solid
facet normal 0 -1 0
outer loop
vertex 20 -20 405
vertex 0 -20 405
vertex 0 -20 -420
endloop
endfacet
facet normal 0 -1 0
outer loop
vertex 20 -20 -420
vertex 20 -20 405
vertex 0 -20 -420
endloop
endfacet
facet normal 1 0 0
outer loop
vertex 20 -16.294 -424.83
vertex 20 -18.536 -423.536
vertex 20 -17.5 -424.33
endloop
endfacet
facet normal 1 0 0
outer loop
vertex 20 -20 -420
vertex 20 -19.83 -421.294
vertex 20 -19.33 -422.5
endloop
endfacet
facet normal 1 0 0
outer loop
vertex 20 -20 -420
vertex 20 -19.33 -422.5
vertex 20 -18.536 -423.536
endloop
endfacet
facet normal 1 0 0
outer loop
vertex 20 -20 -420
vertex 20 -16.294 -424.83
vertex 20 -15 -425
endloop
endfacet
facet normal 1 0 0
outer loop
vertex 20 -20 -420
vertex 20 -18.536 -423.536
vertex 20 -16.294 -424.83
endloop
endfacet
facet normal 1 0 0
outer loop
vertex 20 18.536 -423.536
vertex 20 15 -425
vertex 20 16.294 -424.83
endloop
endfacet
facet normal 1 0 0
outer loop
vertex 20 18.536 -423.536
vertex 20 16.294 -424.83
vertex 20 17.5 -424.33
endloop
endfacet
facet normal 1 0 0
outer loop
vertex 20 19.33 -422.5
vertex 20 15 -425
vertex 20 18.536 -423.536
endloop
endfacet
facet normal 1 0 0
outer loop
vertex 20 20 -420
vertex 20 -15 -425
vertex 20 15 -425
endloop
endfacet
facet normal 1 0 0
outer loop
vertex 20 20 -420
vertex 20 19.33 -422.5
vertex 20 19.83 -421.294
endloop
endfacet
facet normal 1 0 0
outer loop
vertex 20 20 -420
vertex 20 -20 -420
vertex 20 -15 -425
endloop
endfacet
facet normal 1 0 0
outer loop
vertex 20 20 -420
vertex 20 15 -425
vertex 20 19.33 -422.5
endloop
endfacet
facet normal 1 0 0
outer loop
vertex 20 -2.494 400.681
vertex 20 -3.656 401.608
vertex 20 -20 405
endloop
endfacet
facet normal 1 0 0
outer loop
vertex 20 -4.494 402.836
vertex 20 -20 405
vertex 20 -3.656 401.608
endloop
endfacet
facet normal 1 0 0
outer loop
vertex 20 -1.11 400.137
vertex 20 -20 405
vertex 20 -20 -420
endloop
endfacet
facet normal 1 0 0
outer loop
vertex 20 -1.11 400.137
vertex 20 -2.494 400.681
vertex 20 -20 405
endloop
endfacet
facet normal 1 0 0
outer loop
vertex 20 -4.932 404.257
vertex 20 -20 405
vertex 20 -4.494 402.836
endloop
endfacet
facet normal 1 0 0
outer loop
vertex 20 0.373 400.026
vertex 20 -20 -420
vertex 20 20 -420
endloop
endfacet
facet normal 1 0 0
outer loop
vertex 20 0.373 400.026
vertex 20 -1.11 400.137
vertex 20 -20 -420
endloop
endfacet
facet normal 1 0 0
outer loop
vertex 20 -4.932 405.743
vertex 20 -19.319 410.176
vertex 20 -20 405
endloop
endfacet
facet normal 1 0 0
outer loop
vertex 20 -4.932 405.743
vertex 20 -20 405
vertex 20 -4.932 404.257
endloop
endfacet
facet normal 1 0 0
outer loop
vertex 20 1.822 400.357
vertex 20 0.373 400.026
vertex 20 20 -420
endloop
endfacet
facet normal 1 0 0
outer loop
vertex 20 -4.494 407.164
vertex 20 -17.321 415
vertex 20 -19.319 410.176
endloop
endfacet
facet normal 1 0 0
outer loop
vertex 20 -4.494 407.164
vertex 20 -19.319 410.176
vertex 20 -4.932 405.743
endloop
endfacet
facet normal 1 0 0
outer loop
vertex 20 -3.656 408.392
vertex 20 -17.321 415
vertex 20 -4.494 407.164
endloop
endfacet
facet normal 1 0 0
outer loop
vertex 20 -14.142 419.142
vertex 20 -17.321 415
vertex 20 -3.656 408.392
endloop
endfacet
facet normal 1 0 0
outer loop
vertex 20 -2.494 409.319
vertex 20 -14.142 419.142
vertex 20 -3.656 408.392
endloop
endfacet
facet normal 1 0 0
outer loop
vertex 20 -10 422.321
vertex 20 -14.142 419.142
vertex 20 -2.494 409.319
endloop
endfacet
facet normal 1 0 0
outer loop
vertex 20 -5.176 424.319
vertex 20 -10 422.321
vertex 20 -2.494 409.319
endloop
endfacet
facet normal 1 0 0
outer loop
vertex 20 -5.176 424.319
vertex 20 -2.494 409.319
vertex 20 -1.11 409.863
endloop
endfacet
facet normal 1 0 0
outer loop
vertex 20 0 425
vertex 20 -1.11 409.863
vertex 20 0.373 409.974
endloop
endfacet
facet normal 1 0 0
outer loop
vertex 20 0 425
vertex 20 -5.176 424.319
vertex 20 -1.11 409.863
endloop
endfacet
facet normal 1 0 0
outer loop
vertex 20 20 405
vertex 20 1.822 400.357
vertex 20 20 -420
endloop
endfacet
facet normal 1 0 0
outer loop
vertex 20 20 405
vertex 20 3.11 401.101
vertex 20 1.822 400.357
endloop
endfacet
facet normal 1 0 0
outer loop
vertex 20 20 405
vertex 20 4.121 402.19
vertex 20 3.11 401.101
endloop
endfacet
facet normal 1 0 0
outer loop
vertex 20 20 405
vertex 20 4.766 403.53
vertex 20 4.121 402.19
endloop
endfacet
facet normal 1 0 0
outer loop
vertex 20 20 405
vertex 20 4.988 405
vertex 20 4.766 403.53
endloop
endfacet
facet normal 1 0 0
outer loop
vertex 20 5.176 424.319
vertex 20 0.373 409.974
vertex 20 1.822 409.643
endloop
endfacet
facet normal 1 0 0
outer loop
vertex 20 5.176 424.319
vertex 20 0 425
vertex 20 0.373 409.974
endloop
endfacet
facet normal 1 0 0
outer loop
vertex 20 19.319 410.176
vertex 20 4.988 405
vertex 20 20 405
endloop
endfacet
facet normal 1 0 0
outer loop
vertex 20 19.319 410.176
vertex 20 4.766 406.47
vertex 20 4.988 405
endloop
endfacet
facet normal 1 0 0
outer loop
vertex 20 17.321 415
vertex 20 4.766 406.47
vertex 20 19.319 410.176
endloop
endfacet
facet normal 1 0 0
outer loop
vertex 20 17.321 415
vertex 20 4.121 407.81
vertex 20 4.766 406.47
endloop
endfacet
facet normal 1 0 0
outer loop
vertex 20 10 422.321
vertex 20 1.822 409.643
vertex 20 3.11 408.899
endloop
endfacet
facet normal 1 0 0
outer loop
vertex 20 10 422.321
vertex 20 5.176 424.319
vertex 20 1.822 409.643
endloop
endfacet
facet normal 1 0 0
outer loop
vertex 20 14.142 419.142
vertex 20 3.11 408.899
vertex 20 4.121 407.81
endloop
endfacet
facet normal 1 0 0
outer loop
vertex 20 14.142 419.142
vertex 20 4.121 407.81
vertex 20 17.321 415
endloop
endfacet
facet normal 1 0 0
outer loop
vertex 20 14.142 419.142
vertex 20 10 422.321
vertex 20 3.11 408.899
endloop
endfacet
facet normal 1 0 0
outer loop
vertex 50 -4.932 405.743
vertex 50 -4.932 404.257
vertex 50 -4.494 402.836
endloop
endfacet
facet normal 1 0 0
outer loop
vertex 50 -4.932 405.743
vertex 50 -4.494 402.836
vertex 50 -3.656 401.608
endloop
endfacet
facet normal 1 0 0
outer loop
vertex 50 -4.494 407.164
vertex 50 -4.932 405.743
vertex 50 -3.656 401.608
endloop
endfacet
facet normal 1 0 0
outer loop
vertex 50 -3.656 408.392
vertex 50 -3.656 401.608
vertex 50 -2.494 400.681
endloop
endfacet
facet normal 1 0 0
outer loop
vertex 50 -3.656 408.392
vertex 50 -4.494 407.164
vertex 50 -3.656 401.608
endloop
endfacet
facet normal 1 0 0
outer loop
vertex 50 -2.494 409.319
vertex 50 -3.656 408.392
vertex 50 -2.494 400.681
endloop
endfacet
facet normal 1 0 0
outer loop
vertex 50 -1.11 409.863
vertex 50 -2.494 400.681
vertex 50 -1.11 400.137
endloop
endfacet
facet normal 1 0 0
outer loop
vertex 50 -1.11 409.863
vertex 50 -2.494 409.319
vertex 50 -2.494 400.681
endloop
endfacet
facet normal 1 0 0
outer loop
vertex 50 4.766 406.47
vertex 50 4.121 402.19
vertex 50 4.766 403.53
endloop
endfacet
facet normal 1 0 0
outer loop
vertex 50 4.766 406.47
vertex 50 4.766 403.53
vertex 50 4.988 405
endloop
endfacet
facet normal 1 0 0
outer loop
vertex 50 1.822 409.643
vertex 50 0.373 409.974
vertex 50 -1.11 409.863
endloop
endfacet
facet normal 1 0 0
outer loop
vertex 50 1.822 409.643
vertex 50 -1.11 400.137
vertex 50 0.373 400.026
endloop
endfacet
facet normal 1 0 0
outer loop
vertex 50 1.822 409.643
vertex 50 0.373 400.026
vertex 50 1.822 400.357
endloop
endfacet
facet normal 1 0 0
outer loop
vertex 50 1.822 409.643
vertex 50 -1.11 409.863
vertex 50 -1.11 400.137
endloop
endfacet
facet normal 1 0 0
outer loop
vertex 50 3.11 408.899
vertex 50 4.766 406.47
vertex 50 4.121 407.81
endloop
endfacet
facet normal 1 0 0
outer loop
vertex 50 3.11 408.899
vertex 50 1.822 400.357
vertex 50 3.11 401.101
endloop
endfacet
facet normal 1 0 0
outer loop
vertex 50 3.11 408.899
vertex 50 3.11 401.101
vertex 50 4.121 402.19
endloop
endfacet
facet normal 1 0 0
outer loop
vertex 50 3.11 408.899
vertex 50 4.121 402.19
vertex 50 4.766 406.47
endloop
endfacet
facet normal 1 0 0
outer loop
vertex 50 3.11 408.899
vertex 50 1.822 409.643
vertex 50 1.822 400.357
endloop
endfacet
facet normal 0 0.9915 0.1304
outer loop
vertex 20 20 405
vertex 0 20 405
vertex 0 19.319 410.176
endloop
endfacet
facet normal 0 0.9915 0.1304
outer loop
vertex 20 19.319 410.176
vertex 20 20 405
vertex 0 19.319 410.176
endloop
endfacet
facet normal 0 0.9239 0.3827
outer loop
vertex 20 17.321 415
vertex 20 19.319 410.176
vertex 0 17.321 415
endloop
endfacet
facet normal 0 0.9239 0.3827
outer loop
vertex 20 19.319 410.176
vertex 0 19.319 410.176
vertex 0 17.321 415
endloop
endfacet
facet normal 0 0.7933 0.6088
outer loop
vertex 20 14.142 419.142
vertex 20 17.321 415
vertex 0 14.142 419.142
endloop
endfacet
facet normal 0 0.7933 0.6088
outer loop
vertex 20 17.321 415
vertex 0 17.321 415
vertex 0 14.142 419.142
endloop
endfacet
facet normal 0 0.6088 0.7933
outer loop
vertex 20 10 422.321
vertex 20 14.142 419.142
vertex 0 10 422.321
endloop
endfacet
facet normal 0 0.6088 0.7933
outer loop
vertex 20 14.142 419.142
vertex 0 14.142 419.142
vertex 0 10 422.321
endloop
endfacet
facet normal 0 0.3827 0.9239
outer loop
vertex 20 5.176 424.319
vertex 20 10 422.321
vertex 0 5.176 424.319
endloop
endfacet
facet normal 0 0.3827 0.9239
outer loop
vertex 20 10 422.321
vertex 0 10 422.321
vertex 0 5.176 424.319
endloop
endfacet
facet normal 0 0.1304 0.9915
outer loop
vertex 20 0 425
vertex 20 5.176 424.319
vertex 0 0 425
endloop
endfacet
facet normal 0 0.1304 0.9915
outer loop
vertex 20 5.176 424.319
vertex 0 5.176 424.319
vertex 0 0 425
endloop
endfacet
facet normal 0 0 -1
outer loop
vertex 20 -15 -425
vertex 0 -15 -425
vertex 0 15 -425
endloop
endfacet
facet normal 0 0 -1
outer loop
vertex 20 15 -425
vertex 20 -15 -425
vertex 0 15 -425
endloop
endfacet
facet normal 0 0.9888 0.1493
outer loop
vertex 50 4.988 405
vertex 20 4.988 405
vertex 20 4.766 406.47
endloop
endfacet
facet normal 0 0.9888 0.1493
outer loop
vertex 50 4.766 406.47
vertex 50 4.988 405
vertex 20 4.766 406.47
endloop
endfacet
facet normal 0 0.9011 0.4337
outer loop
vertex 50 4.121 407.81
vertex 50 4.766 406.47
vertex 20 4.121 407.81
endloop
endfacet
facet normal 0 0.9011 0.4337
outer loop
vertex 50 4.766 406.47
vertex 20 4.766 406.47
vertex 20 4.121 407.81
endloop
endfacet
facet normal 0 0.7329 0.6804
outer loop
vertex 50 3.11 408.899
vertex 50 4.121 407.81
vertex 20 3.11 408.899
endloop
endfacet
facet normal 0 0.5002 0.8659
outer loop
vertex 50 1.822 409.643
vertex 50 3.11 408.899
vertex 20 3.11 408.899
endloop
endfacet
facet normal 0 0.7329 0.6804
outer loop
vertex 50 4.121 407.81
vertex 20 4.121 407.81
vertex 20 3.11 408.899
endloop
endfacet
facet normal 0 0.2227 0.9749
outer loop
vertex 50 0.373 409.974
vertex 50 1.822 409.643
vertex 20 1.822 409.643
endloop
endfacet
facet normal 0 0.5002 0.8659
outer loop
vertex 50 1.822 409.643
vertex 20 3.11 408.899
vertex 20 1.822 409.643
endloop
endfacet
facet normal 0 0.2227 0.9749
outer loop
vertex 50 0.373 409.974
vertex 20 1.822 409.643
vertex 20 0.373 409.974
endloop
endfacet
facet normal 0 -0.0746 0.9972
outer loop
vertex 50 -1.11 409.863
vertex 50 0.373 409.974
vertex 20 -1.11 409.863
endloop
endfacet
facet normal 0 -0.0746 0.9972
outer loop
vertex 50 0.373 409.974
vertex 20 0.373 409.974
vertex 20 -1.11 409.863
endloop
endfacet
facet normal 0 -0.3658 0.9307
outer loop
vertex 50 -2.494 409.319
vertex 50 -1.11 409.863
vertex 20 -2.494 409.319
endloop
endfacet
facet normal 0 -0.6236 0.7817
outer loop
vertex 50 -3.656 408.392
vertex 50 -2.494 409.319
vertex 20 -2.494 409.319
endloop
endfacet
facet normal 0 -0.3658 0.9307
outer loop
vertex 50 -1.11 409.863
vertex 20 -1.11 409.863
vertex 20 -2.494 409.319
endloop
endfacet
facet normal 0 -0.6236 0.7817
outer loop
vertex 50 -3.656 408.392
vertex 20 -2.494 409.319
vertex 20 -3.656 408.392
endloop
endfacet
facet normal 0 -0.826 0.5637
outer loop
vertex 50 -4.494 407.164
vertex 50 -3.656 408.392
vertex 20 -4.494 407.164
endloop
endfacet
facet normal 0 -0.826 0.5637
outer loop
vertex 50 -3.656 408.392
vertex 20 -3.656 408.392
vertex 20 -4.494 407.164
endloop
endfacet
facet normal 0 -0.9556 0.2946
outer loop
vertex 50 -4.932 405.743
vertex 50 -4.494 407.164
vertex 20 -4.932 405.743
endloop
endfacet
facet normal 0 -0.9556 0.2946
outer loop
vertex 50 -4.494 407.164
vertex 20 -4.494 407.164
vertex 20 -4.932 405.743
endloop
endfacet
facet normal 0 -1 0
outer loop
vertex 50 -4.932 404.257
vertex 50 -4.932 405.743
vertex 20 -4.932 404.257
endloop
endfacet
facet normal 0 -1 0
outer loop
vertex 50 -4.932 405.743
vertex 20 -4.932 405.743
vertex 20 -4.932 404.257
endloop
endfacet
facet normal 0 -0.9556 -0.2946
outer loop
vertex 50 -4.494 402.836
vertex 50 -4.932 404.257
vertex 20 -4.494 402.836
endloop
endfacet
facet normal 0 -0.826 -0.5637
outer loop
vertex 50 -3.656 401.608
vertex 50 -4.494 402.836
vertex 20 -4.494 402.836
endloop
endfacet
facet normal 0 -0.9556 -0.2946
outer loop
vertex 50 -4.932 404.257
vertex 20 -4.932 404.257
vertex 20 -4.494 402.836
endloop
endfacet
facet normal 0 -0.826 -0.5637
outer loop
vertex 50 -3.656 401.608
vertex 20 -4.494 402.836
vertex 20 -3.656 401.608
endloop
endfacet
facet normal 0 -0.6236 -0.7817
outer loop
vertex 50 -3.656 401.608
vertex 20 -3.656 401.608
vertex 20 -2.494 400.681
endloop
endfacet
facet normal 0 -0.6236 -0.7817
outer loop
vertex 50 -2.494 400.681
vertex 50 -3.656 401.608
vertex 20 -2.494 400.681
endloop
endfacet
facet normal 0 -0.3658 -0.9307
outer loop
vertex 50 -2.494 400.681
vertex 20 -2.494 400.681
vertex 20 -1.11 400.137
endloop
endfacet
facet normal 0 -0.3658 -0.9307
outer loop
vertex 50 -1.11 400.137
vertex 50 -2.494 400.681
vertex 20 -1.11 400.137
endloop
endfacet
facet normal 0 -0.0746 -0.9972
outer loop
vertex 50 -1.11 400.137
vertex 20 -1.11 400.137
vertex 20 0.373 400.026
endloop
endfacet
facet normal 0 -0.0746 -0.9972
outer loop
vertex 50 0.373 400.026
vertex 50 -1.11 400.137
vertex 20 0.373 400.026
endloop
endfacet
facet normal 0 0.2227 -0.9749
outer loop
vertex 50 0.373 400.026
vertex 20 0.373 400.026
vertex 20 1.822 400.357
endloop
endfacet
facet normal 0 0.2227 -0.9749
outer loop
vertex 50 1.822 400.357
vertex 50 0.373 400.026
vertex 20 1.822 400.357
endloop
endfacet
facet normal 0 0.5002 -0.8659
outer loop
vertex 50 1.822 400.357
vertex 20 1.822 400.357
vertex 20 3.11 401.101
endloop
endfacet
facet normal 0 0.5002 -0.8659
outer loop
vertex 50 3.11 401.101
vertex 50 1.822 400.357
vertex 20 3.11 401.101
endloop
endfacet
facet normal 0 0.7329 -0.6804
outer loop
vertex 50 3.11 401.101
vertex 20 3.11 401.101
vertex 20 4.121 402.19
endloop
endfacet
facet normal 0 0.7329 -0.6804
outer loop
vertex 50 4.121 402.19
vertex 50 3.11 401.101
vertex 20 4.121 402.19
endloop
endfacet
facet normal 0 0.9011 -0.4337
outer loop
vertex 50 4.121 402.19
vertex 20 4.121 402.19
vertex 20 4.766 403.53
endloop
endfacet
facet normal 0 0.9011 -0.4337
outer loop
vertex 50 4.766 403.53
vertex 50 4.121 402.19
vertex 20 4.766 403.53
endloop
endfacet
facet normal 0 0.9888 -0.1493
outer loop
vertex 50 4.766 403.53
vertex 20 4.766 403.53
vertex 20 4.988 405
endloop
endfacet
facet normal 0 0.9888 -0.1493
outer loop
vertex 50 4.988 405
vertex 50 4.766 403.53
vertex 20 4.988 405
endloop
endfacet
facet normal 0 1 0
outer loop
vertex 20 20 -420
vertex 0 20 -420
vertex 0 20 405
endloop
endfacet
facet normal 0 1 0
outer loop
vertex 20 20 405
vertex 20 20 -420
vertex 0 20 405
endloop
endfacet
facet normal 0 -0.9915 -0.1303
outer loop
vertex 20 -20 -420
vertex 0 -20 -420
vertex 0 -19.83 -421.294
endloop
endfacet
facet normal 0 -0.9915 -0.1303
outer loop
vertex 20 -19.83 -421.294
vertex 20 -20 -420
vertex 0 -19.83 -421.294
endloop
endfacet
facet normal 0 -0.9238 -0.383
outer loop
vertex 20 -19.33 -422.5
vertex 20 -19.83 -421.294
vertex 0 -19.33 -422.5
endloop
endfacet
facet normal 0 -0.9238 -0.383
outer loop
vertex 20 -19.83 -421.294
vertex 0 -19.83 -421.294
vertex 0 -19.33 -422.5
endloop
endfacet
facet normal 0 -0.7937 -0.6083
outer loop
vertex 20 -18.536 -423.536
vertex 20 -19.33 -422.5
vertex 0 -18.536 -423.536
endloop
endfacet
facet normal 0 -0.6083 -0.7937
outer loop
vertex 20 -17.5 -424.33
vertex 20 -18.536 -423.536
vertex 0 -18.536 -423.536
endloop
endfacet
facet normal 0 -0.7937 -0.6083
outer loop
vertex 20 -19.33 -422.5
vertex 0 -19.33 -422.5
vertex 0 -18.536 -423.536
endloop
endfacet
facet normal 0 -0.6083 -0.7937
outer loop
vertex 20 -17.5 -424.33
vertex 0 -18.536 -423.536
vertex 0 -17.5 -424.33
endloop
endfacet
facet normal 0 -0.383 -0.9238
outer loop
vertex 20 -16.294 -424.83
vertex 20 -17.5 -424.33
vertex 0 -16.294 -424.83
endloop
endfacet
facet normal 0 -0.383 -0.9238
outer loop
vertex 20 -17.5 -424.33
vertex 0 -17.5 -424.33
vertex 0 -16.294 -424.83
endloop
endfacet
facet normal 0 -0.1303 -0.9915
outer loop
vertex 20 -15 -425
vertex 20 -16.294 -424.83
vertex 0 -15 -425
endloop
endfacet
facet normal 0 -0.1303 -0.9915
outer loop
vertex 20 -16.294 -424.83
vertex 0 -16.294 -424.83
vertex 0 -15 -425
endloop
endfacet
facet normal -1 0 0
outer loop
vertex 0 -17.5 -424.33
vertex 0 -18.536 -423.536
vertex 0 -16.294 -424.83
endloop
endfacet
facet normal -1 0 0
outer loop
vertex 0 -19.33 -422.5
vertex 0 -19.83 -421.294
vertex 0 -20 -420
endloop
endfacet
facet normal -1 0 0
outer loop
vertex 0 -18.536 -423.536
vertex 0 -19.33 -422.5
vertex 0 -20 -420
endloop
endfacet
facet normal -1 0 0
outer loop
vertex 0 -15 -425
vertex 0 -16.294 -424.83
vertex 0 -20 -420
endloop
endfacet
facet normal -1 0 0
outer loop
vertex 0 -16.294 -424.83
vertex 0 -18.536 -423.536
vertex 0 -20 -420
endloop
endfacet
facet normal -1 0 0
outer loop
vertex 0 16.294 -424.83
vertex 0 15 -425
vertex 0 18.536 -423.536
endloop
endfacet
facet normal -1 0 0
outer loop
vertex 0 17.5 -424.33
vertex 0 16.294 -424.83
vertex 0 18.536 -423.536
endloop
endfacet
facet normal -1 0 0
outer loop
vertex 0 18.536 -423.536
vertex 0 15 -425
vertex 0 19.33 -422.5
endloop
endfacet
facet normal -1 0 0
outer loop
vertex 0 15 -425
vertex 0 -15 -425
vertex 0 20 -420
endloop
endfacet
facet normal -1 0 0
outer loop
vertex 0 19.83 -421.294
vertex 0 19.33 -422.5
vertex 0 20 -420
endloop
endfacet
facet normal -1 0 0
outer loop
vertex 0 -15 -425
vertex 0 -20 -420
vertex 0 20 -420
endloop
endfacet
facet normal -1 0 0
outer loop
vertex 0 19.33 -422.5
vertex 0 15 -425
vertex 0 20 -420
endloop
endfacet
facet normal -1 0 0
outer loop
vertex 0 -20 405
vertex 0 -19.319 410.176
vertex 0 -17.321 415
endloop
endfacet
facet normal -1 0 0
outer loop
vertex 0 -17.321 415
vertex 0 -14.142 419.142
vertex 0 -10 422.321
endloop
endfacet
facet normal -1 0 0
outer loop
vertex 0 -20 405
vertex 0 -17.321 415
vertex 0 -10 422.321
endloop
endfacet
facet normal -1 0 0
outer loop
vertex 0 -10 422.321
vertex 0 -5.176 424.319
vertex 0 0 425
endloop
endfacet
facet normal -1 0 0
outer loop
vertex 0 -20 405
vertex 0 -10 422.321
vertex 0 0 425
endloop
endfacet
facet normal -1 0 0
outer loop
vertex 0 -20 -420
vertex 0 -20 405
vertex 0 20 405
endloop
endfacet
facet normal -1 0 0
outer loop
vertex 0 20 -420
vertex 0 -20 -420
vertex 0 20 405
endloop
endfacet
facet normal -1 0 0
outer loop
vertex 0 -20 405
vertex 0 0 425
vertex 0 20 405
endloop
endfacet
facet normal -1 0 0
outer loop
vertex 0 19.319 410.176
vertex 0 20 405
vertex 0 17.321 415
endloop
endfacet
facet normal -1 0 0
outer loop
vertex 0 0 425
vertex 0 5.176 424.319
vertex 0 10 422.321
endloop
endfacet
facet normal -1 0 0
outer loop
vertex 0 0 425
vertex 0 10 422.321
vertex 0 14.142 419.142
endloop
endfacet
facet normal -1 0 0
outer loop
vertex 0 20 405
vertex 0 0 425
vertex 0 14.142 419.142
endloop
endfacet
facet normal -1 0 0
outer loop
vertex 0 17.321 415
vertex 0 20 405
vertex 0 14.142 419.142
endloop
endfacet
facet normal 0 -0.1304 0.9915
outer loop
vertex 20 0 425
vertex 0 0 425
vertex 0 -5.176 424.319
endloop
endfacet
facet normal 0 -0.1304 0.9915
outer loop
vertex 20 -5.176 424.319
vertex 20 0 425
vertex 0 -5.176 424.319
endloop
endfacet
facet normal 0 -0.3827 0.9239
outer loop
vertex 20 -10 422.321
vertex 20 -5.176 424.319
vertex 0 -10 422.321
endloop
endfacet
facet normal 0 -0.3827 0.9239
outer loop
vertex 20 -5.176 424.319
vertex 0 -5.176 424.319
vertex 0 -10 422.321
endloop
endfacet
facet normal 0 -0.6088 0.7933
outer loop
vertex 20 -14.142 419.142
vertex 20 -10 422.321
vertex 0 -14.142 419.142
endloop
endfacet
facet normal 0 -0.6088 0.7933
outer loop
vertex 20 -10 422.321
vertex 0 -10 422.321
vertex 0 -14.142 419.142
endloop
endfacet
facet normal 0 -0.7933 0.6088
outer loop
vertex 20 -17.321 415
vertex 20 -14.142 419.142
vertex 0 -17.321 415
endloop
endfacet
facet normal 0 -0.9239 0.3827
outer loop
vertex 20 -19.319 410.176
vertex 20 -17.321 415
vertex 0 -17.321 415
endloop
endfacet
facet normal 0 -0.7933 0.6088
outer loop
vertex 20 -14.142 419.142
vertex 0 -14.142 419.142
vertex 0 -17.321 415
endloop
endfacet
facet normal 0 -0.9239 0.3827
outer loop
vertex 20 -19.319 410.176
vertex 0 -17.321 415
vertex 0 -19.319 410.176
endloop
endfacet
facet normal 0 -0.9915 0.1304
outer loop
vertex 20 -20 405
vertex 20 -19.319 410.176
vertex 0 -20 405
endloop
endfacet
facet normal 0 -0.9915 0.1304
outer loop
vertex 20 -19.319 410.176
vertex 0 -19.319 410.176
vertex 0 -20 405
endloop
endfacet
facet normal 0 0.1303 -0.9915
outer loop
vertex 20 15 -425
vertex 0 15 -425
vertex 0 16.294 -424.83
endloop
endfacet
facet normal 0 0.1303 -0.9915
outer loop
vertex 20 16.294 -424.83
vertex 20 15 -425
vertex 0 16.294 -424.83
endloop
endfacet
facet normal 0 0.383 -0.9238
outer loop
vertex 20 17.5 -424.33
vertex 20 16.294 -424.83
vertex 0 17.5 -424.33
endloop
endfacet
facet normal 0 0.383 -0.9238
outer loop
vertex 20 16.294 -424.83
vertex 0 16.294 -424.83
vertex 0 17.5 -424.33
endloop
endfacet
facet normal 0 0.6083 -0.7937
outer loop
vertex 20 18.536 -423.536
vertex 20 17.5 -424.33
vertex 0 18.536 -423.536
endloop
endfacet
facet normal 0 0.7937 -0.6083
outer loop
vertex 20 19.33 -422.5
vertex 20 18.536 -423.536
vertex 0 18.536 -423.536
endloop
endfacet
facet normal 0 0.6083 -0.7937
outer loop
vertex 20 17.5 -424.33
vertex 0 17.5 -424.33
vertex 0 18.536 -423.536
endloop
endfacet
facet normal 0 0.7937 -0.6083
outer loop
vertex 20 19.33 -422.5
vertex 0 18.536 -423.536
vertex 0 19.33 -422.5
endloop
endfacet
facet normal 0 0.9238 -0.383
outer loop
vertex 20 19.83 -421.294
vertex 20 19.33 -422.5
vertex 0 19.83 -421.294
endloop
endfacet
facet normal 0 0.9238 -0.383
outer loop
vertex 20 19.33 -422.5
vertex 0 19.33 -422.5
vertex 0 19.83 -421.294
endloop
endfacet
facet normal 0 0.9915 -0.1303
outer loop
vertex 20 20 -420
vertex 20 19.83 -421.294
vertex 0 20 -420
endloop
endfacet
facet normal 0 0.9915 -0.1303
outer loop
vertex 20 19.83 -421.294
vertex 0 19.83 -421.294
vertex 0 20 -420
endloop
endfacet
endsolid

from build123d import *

# Parameters (mm, degrees)
F0_R     = 4.987569
F1_DEPTH = 20
F2_DEPTH = 50


with BuildPart() as f1:
    # F0 (on Right) → F1 (new body)
    with BuildSketch(Plane.YZ):
        with BuildLine():
            ThreePointArc((-20, -420), (-18.535534, -423.535534), (-15, -425))
            Line((-15, -425), (15, -425))
            ThreePointArc((15, -425), (18.535534, -423.535534), (20, -420))
            Line((20, -420), (20, 405))
            ThreePointArc((20, 405), (14.142136, 419.142136), (0, 425))
            ThreePointArc((0, 425), (-14.142136, 419.142136), (-20, 405))
            Line((-20, 405), (-20, -420))
        make_face()
        with Locations((0, 405)):
            Circle(F0_R, mode=Mode.SUBTRACT)
    extrude(amount=F1_DEPTH)

    # F0 (on Right) → F2 (join)
    with BuildSketch(Plane.YZ):
        with Locations((0, 405)):
            Circle(F0_R)
    extrude(amount=F2_DEPTH)


solid = f1.part
